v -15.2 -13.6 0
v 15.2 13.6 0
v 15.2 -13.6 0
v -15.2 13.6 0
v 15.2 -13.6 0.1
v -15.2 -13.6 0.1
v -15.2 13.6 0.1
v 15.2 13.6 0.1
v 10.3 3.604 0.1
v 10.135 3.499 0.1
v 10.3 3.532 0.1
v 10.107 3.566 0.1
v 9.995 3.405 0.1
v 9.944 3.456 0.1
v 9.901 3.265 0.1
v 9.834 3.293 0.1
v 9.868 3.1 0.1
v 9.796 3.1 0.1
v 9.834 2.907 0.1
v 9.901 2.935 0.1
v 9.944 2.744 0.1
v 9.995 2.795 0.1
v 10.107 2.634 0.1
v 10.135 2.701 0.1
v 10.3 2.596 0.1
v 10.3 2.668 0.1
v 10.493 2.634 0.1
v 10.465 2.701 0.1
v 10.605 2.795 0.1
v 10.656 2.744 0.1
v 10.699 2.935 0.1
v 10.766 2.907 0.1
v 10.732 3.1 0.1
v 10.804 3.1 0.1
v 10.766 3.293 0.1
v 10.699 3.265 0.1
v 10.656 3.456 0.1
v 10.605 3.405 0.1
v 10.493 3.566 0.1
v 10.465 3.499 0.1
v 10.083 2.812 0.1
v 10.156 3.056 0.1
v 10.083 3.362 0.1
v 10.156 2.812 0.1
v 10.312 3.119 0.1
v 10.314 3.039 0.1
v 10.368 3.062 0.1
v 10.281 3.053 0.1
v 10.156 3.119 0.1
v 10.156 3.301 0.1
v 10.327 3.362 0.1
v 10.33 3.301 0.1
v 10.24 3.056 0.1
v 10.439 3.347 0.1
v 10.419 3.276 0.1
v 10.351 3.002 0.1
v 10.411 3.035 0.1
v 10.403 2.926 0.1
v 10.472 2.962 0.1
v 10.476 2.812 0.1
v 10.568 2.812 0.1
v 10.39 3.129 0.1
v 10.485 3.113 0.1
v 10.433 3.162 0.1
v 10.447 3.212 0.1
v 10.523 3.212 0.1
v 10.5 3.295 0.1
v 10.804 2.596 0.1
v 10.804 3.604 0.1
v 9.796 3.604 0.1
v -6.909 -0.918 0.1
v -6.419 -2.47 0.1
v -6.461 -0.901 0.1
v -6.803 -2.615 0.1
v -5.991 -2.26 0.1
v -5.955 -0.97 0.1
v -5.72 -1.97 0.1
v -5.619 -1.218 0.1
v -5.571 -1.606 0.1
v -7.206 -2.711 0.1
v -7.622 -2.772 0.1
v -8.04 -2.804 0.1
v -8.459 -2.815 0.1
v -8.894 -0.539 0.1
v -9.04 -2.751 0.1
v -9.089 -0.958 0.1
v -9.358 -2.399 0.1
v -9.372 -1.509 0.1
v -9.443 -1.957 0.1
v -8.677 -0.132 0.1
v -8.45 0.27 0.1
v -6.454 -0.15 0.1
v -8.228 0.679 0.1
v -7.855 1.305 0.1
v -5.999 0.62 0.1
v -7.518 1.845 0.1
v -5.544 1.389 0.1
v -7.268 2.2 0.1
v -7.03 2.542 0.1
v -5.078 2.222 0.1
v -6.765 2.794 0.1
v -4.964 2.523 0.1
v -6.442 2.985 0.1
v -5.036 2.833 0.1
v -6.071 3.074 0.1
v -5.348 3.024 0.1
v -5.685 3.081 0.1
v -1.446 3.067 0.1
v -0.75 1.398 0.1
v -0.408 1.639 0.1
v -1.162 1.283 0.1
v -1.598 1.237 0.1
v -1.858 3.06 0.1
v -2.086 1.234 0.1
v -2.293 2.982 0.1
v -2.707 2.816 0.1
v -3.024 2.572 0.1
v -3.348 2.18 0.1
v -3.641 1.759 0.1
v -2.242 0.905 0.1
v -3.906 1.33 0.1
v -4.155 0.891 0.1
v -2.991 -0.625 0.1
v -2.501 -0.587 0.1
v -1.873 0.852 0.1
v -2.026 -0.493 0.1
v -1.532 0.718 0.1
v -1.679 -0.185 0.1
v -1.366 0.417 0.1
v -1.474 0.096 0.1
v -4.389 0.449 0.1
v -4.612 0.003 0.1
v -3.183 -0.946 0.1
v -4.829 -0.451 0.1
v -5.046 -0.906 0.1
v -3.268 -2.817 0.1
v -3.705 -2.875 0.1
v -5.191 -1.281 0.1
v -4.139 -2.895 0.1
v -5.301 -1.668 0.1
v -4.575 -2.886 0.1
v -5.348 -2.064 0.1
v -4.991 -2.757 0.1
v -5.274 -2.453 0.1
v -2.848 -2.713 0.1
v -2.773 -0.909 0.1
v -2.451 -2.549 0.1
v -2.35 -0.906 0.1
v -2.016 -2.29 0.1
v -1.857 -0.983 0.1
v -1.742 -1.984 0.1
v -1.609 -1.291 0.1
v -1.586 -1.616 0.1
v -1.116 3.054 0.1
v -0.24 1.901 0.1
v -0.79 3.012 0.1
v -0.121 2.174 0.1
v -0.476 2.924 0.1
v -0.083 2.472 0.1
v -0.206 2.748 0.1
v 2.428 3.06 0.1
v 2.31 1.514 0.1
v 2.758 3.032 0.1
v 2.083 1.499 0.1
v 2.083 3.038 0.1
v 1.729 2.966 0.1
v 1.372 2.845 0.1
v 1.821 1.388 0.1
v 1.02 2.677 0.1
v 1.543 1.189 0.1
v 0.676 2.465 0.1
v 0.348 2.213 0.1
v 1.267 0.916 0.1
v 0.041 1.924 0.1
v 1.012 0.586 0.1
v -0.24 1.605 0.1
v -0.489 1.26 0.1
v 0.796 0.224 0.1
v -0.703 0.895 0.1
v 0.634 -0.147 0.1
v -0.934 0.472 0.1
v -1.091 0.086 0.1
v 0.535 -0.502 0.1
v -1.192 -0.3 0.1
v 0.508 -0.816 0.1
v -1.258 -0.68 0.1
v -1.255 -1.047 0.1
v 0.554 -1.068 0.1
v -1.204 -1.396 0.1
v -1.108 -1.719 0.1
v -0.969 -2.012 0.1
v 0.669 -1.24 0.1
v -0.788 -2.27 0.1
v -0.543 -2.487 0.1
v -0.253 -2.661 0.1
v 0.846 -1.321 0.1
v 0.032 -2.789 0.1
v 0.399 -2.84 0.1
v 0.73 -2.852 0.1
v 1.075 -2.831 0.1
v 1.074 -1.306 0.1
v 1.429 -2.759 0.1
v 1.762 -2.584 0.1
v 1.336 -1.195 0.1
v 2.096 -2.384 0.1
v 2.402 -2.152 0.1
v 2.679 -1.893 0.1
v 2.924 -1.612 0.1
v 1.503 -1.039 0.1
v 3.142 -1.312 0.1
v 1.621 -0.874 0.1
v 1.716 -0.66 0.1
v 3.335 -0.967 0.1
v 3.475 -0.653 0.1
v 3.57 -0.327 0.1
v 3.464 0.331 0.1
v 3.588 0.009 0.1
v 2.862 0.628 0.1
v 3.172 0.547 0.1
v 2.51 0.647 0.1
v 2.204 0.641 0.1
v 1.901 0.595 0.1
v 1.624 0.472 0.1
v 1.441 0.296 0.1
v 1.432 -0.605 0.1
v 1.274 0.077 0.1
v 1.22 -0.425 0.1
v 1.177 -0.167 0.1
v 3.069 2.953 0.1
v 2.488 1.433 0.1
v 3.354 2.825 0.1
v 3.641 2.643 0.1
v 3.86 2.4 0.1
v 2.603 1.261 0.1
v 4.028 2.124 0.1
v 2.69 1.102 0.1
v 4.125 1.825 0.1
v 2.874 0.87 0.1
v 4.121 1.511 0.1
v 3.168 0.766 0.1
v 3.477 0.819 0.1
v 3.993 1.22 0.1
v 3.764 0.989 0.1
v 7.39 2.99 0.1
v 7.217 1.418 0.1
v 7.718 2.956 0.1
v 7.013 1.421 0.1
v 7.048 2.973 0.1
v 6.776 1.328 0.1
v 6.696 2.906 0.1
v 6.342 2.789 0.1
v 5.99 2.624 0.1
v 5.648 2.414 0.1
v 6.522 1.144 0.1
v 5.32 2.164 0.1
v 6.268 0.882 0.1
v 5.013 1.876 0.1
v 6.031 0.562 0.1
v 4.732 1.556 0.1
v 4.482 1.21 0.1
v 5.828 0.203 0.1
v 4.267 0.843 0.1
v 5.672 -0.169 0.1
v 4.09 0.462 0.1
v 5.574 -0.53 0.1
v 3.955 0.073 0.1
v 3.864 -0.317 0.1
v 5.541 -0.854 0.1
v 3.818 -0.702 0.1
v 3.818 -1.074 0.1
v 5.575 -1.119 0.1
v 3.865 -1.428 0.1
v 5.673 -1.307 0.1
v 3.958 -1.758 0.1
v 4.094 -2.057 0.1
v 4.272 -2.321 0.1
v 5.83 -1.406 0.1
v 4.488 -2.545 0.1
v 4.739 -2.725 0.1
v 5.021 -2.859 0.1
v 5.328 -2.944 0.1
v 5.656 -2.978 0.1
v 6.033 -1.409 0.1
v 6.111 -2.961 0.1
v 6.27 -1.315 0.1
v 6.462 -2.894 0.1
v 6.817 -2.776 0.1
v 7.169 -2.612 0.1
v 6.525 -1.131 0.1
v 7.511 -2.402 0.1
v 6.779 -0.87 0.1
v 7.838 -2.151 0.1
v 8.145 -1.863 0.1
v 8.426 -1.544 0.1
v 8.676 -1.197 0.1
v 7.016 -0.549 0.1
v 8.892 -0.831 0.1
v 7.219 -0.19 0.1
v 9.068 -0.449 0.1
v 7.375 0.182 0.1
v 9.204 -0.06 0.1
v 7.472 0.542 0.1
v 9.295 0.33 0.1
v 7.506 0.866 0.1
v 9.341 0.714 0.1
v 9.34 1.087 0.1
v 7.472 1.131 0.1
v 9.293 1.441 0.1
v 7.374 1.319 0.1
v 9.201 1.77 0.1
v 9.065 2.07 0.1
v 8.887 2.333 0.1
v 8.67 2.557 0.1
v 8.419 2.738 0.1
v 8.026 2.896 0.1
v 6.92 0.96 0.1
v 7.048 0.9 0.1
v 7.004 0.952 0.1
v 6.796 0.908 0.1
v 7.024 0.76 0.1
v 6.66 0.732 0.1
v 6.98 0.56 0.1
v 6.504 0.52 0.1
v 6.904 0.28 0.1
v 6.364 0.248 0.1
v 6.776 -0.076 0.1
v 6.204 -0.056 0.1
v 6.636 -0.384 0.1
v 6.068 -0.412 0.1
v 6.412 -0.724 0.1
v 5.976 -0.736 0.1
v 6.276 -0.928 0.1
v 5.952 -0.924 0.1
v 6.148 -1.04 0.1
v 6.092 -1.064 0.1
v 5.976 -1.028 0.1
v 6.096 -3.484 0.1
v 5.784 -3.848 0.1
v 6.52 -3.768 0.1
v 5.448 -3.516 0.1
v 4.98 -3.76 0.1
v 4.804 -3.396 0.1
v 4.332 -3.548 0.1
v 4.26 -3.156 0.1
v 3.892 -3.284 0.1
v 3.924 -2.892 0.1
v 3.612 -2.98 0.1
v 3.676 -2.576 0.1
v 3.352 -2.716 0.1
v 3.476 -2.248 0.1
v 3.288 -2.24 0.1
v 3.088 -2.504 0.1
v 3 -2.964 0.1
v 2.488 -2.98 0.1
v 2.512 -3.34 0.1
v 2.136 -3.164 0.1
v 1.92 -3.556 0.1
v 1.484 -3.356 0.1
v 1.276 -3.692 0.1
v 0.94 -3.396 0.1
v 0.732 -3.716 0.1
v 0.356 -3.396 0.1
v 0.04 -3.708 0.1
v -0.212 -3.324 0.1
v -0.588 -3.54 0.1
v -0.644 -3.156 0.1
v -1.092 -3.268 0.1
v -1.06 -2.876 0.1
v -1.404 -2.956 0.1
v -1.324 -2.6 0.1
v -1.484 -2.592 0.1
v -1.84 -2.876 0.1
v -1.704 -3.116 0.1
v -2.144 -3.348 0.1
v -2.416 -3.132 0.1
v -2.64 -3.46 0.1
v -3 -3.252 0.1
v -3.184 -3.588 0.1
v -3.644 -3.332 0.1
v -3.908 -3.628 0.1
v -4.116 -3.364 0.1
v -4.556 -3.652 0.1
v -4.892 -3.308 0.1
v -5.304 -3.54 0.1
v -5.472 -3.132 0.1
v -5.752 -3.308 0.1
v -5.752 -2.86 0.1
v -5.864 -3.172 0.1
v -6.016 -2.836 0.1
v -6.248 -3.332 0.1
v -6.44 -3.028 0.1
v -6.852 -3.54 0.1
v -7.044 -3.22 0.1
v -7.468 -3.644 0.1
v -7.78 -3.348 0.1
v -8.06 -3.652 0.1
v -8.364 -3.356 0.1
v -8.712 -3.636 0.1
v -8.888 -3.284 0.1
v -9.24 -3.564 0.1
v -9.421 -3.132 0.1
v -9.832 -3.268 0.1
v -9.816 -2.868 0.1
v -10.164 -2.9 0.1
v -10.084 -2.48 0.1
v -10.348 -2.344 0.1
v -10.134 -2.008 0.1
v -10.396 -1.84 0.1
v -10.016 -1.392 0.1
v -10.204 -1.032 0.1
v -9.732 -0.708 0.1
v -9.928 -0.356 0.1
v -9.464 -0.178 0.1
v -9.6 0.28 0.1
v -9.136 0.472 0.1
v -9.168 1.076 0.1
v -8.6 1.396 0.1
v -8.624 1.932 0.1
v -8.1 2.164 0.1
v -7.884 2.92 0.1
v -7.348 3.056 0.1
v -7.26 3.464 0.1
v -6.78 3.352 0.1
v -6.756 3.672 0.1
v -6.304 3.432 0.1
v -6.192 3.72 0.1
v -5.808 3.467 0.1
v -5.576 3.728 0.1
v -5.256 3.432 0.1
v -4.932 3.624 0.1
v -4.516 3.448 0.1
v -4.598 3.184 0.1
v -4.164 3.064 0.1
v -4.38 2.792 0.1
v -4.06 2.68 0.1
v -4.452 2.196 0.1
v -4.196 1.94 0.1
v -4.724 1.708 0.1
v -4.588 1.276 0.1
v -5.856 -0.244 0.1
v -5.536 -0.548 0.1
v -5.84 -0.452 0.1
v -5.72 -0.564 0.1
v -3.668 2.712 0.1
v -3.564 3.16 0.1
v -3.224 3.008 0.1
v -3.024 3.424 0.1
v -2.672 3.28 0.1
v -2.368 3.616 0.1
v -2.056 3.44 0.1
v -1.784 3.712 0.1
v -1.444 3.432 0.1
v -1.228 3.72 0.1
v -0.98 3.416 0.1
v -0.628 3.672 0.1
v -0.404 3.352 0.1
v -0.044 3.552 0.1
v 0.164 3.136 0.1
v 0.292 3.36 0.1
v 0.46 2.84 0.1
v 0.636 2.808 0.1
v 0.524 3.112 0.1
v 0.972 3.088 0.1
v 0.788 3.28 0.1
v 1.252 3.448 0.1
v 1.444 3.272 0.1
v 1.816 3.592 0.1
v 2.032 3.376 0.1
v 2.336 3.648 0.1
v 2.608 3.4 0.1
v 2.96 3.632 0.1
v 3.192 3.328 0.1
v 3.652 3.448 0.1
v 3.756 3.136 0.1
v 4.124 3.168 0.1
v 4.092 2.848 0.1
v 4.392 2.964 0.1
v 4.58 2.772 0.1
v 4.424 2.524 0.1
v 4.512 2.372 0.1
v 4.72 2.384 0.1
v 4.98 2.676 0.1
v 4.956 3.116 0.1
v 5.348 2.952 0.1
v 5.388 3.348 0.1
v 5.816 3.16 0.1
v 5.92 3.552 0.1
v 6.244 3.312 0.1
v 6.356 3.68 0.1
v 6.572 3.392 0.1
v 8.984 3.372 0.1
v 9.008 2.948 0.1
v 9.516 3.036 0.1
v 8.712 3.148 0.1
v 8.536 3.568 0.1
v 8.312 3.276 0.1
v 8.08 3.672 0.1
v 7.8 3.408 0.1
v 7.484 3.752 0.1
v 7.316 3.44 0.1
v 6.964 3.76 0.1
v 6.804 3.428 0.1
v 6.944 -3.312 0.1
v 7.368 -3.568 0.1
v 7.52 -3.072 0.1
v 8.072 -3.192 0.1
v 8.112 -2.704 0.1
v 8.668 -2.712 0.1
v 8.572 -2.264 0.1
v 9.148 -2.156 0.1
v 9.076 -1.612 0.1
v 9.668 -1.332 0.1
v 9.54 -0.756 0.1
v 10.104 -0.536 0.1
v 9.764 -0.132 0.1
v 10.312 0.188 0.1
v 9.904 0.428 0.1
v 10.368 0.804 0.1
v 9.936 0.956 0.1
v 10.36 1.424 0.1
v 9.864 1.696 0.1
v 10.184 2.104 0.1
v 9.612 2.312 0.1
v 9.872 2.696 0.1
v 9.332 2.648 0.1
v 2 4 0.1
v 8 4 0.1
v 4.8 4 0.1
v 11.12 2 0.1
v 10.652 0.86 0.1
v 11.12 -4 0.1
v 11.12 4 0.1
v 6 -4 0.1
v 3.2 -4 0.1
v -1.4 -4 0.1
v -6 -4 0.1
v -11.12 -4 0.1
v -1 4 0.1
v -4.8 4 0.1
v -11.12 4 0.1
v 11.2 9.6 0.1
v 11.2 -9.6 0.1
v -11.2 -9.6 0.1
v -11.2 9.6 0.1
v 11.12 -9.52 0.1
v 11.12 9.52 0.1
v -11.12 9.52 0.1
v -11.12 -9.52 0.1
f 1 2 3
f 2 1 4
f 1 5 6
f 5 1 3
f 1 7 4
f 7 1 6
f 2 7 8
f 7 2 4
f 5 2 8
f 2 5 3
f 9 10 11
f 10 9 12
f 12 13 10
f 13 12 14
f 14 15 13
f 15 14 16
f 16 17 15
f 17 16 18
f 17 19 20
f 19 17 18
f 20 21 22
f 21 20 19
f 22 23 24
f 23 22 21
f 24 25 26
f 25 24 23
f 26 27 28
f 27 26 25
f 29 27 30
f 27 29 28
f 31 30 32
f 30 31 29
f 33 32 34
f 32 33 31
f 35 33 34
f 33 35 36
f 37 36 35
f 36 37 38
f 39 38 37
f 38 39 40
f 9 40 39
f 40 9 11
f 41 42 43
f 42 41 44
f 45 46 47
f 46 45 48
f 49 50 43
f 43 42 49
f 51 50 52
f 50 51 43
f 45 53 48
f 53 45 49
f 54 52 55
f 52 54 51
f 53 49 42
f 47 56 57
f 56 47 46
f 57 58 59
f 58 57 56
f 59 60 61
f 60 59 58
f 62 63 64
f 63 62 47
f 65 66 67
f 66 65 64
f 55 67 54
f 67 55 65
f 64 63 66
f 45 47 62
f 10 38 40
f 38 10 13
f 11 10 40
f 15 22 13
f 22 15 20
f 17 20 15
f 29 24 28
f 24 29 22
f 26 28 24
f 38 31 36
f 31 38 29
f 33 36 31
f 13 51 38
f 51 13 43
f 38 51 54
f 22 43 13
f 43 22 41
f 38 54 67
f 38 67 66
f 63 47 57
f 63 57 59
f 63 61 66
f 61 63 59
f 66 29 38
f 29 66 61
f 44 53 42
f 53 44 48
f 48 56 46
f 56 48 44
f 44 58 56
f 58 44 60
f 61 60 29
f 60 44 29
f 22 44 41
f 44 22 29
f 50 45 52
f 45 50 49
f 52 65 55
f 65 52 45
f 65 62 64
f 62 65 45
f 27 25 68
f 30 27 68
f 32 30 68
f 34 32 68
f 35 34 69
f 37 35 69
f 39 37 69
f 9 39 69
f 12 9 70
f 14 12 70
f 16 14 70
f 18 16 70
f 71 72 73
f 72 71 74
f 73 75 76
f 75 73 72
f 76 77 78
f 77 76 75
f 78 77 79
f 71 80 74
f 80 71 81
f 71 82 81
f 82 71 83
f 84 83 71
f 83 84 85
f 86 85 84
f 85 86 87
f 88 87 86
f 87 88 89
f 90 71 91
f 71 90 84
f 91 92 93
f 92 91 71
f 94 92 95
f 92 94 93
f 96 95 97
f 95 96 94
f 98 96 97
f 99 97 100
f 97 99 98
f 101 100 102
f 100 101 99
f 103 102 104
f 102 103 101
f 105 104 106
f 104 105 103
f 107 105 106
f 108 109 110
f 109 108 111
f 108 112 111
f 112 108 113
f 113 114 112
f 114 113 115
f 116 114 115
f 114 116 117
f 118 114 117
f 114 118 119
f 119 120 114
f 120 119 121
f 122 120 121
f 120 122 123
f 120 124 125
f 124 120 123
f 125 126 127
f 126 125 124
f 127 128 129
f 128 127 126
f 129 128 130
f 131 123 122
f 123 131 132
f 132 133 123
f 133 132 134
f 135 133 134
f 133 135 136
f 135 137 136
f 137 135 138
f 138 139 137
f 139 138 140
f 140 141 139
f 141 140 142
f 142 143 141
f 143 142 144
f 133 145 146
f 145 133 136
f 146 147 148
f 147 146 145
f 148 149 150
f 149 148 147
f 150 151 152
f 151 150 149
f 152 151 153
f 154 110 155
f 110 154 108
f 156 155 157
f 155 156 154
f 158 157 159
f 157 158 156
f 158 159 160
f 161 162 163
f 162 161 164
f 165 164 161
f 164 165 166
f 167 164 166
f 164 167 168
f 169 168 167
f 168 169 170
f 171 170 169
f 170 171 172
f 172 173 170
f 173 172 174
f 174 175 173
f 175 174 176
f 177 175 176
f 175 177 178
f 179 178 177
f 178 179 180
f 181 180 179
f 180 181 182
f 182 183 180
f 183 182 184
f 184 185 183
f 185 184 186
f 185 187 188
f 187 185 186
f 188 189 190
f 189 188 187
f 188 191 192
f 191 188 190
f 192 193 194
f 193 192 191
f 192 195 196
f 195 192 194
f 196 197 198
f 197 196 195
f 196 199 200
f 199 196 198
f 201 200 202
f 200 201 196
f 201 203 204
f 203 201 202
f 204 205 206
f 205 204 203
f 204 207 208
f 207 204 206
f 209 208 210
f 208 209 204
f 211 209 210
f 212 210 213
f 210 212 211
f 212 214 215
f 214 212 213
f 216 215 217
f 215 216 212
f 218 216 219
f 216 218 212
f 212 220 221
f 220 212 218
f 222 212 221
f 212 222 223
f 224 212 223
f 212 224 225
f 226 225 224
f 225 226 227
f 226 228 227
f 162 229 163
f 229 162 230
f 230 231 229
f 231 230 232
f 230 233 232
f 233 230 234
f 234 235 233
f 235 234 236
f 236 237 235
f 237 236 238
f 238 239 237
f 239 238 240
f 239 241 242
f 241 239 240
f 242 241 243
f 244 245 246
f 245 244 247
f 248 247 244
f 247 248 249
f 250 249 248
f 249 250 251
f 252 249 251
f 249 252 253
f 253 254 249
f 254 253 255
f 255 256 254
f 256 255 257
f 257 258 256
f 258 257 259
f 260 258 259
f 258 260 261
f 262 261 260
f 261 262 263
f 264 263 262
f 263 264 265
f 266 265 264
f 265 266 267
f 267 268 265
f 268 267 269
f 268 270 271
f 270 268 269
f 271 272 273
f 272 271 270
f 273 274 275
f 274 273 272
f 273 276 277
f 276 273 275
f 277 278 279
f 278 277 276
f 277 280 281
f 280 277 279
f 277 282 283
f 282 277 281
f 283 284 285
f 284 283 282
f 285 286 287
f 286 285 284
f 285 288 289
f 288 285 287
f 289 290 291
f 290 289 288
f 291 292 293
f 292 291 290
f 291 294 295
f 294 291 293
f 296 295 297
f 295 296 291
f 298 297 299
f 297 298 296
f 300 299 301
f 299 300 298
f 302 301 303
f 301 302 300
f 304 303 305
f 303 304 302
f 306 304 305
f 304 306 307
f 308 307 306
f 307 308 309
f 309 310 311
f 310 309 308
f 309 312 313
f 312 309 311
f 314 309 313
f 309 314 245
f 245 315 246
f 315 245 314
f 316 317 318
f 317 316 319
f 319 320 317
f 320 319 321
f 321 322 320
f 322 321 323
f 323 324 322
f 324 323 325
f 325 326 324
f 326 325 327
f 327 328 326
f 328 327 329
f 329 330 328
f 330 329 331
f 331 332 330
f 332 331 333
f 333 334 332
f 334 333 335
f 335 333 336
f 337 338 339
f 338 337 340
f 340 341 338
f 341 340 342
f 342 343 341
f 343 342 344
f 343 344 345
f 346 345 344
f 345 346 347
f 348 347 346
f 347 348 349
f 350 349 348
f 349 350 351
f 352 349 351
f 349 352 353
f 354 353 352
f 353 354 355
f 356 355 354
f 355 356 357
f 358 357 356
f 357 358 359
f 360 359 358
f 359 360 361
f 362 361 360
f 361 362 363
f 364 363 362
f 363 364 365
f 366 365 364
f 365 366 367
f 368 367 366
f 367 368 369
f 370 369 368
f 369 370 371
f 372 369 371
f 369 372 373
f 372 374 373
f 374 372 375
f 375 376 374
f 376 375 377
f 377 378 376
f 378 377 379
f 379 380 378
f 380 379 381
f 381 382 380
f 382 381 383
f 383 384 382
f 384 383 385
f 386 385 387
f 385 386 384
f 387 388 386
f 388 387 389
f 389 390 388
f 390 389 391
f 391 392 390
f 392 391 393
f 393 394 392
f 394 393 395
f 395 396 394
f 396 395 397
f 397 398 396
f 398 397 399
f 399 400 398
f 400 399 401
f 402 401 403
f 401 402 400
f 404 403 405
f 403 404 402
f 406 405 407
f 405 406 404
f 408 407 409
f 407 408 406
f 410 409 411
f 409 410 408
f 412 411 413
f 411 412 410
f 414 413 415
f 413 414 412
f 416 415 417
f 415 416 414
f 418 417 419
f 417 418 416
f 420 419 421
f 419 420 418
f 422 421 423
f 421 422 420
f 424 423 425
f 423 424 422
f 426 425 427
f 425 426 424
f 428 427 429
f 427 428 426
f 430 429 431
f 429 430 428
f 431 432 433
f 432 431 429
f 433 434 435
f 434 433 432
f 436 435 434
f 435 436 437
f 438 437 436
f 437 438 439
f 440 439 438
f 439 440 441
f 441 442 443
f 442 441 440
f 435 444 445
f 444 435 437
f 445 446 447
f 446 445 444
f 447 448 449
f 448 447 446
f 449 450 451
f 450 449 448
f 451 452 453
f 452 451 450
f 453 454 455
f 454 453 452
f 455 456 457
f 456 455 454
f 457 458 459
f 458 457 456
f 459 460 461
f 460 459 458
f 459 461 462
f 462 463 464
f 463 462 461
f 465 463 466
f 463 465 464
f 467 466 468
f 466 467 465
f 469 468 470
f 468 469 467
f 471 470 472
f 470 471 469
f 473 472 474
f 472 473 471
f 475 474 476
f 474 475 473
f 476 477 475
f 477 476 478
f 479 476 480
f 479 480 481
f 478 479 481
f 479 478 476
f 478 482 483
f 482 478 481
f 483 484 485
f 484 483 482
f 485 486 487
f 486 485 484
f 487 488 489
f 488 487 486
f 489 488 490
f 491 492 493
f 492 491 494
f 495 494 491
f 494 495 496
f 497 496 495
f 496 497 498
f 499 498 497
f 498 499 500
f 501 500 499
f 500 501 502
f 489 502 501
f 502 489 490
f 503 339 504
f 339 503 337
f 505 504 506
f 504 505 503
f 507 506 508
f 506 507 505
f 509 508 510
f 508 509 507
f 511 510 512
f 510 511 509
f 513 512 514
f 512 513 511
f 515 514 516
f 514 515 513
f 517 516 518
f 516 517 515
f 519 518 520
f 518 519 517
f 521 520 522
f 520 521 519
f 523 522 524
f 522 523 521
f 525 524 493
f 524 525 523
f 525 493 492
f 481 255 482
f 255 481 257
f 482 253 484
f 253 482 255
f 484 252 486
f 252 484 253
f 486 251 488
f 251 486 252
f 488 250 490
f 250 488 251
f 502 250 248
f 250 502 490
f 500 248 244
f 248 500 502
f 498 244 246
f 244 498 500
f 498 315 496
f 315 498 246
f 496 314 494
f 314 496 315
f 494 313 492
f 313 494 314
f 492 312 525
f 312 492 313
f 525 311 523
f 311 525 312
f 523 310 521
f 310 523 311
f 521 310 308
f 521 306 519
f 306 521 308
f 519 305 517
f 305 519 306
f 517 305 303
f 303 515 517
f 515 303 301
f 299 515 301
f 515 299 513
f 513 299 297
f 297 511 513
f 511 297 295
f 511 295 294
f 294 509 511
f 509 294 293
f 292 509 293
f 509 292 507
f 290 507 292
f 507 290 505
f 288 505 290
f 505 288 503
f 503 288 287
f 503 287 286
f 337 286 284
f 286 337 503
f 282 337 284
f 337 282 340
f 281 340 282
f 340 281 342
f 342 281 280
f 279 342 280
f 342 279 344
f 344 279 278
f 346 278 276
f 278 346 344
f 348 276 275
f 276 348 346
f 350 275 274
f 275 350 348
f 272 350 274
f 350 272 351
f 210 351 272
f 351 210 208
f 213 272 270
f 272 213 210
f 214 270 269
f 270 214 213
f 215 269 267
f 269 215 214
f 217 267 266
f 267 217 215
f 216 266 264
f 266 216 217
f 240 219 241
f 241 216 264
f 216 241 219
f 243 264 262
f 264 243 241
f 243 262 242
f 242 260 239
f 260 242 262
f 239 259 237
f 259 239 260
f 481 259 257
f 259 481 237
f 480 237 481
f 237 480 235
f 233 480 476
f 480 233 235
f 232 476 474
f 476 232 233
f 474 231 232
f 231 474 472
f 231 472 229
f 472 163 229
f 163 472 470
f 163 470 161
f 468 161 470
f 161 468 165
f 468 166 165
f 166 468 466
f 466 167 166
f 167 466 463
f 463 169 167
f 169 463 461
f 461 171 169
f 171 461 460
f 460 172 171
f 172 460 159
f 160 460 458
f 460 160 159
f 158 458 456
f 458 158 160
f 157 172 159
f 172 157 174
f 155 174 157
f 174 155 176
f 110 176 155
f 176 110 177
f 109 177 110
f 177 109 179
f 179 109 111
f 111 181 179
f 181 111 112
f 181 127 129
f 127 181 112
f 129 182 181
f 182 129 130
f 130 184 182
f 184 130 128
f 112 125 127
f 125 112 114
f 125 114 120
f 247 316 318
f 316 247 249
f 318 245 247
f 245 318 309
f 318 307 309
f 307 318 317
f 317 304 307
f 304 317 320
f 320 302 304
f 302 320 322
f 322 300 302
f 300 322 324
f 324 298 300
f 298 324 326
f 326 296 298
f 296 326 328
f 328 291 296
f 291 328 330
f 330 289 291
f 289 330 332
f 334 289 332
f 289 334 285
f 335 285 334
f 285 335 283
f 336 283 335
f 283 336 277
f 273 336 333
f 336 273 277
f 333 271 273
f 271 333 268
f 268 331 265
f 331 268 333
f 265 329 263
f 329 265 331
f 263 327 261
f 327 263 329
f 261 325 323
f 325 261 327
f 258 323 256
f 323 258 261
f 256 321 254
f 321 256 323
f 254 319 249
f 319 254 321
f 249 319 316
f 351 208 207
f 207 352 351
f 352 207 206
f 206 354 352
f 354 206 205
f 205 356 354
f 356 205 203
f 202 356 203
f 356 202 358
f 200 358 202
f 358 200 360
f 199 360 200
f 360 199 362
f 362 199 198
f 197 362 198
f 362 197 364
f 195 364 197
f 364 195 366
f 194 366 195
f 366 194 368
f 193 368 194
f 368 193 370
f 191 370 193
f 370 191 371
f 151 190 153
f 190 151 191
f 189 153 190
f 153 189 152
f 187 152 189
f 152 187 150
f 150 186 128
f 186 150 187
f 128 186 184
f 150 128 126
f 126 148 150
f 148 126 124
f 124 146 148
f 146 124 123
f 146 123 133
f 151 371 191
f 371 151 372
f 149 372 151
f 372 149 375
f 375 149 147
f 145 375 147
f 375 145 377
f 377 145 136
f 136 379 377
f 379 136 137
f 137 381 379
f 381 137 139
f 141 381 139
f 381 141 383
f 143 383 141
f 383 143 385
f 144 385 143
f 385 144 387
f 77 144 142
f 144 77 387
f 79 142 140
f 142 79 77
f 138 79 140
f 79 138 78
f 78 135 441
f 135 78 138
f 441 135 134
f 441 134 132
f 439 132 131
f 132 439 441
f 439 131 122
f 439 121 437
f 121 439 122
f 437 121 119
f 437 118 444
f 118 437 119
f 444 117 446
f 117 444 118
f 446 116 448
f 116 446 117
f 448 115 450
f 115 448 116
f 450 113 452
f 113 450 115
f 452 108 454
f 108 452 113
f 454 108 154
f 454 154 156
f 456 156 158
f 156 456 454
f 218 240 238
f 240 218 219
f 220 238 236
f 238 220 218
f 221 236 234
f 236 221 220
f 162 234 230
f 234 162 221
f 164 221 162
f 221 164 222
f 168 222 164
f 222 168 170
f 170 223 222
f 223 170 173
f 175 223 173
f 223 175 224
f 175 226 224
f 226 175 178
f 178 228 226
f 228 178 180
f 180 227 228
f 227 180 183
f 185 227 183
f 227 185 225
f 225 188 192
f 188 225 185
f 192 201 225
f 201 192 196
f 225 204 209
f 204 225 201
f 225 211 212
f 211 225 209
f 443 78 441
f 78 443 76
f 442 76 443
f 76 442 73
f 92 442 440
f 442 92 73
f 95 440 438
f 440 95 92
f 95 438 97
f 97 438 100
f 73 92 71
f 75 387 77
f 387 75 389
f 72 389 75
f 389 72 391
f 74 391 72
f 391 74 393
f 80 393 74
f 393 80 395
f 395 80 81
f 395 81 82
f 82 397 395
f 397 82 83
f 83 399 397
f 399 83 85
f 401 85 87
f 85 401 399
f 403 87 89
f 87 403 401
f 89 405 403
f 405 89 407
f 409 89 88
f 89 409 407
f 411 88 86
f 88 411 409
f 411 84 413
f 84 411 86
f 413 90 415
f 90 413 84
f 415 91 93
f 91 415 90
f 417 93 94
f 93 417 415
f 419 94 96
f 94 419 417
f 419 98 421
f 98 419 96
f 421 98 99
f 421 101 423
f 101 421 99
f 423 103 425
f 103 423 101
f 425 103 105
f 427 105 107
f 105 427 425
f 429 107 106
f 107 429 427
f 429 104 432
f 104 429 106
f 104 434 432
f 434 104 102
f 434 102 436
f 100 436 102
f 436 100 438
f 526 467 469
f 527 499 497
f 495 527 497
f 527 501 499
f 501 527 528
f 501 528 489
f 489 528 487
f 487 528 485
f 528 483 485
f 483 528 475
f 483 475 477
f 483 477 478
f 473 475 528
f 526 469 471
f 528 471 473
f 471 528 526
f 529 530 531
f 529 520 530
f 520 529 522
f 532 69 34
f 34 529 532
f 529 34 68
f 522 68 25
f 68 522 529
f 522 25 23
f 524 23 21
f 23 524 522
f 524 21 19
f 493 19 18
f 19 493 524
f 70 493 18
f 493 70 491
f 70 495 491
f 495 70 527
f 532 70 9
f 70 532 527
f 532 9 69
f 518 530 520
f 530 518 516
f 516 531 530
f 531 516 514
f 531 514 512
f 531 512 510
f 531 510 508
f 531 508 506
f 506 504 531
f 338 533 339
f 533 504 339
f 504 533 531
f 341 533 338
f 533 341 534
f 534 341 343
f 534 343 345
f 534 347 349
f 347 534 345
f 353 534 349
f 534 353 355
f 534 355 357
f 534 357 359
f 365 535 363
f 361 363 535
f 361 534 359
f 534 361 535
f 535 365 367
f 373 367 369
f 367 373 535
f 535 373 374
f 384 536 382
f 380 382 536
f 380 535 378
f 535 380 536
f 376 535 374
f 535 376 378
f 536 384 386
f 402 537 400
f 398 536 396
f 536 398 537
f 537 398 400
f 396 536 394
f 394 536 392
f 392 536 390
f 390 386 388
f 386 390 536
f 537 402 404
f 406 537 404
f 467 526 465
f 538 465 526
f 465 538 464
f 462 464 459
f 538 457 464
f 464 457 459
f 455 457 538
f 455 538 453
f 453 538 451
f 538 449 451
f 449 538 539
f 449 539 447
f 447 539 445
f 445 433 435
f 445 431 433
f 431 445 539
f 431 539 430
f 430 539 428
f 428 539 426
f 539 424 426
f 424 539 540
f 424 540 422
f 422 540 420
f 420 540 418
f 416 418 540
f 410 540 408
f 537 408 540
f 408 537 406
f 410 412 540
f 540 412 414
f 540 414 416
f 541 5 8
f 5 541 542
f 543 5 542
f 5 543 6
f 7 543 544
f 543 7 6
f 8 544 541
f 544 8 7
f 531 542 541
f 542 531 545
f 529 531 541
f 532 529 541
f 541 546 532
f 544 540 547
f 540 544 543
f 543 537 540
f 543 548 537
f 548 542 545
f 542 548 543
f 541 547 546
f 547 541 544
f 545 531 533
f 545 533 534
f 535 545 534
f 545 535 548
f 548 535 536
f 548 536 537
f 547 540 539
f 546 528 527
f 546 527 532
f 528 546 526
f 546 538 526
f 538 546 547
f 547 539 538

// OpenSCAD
use <../lib.scad>
use <../p/box5-12.scad>
use <s/logolegos01.scad>
function ldraw_lib__821421b() = [
// 0 Sticker  3.4 x  3.8 with Lego Logo (1973-1998)
// 0 Name: 821421b.dat
// 0 Author: Ulrich Röder [UR]
// 0 !LDRAW_ORG Part UPDATE 2020-03
// 0 !LICENSE Licensed under CC BY 2.0 and CC BY 4.0 : see CAreadme.txt
// 
// 0 BFC CERTIFY CCW
  [0,"BFC","CERTIFY"],
  [0,"BFC","CCW"],
// 
// 0 !KEYWORDS container, Set 4549, Train
// 
// 0 !HISTORY 2020-12-29 [PTadmin] Official Update 2020-03
// 
// 
// 0 // narrower yellow border
// 
// 1 16 0 -0.25 0 38 0 0 0 0.25 0 0 0 -34 box5-12.dat
  [1,16,0,-0.25,0,38,0,0,0,0.25,0,0,0,-34, ldraw_lib__box5_12()],
// 1 16 0 0 0 1 0 0 0 1 0 0 0 1 s\logolegos01.dat
  [1,16,0,0,0,1,0,0,0,1,0,0,0,1, ldraw_lib__s__logolegos01()],
// 4 16 38 -.25 34 28 -.25 24 28 -.25 -24 38 -.25 -34
  [4,16,38,-.25,34,28,-.25,24,28,-.25,-24,38,-.25,-34],
// 4 16 28 -.25 -24 -28 -.25 -24 -38 -.25 -34 38 -.25 -34
  [4,16,28,-.25,-24,-28,-.25,-24,-38,-.25,-34,38,-.25,-34],
// 4 16 -38 -.25 -34 -28 -.25 -24 -28 -.25 24 -38 -.25 34
  [4,16,-38,-.25,-34,-28,-.25,-24,-28,-.25,24,-38,-.25,34],
// 4 16 -28 -.25 24 28 -.25 24 38 -.25 34 -38 -.25 34
  [4,16,-28,-.25,24,28,-.25,24,38,-.25,34,-38,-.25,34],
// 
// 0 // Frame
// 4 0 28 -.25 -24 28 -.25 24 27.8 -.25 -10 27.8 -.25 -23.8
  [4,0,28,-.25,-24,28,-.25,24,27.8,-.25,-10,27.8,-.25,-23.8],
// 3 0 27.8 -.25 5 27.8 -.25 -10 28 -.25 24
  [3,0,27.8,-.25,5,27.8,-.25,-10,28,-.25,24],
// 3 0 27.8 -.25 10 27.8 -.25 5 28 -.25 24
  [3,0,27.8,-.25,10,27.8,-.25,5,28,-.25,24],
// 3 0 28 -.25 24 27.8 -.25 23.8 27.8 -.25 10
  [3,0,28,-.25,24,27.8,-.25,23.8,27.8,-.25,10],
// 4 0 -28 -.25 24 -28 -.25 -24 -27.8 -.25 10 -27.8 -.25 23.8
  [4,0,-28,-.25,24,-28,-.25,-24,-27.8,-.25,10,-27.8,-.25,23.8],
// 3 0 -28 -.25 -24 -27.8 -.25 -10 -27.8 -.25 10
  [3,0,-28,-.25,-24,-27.8,-.25,-10,-27.8,-.25,10],
// 3 0 -28 -.25 -24 -27.8 -.25 -23.8 -27.8 -.25 -10
  [3,0,-28,-.25,-24,-27.8,-.25,-23.8,-27.8,-.25,-10],
// 4 0 -28 -.25 -24 28 -.25 -24 27.8 -.25 -23.8 -27.8 -.25 -23.8
  [4,0,-28,-.25,-24,28,-.25,-24,27.8,-.25,-23.8,-27.8,-.25,-23.8],
// 4 0 28 -.25 24 -28 -.25 24 -27.8 -.25 23.8 27.8 -.25 23.8
  [4,0,28,-.25,24,-28,-.25,24,-27.8,-.25,23.8,27.8,-.25,23.8],
// 
// 0 // Red
// 3 4 27.8 -.25 -23.8 27.8 -.25 -10 15 -.25 -10
  [3,4,27.8,-.25,-23.8,27.8,-.25,-10,15,-.25,-10],
// 3 4 27.8 -.25 -23.8 15 -.25 -10 8 -.25 -10
  [3,4,27.8,-.25,-23.8,15,-.25,-10,8,-.25,-10],
// 4 4 -27.8 -.25 -23.8 27.8 -.25 -23.8 8 -.25 -10 -3.5 -.25 -10
  [4,4,-27.8,-.25,-23.8,27.8,-.25,-23.8,8,-.25,-10,-3.5,-.25,-10],
// 3 4 -27.8 -.25 -23.8 -3.5 -.25 -10 -15 -.25 -10
  [3,4,-27.8,-.25,-23.8,-3.5,-.25,-10,-15,-.25,-10],
// 3 4 -27.8 -.25 -23.8 -15 -.25 -10 -27.8 -.25 -10
  [3,4,-27.8,-.25,-23.8,-15,-.25,-10,-27.8,-.25,-10],
// 3 4 -27.8 -.25 23.8 -27.8 -.25 10 -12 -.25 10
  [3,4,-27.8,-.25,23.8,-27.8,-.25,10,-12,-.25,10],
// 3 4 27.8 -.25 23.8 12 -.25 10 20 -.25 10
  [3,4,27.8,-.25,23.8,12,-.25,10,20,-.25,10],
// 3 4 27.8 -.25 23.8 20 -.25 10 27.8 -.25 10
  [3,4,27.8,-.25,23.8,20,-.25,10,27.8,-.25,10],
// 3 4 12 -.25 10 27.8 -.25 23.8 5 -.25 10
  [3,4,12,-.25,10,27.8,-.25,23.8,5,-.25,10],
// 4 4 -27.8 -.25 23.8 -2.5 -.25 10 5 -.25 10 27.8 -.25 23.8
  [4,4,-27.8,-.25,23.8,-2.5,-.25,10,5,-.25,10,27.8,-.25,23.8],
// 3 4 -27.8 -.25 23.8 -12 -.25 10 -2.5 -.25 10
  [3,4,-27.8,-.25,23.8,-12,-.25,10,-2.5,-.25,10],
];
module ldraw_lib__821421b(step=0, col=false, unit=2/5, alt=false, line=0.2, solid=!$preview)
    makepoly(ldraw_lib__821421b(), step=step, col=col, unit=unit, alt=alt, line=line, solid=solid);
ldraw_lib__821421b(line=0.2);
